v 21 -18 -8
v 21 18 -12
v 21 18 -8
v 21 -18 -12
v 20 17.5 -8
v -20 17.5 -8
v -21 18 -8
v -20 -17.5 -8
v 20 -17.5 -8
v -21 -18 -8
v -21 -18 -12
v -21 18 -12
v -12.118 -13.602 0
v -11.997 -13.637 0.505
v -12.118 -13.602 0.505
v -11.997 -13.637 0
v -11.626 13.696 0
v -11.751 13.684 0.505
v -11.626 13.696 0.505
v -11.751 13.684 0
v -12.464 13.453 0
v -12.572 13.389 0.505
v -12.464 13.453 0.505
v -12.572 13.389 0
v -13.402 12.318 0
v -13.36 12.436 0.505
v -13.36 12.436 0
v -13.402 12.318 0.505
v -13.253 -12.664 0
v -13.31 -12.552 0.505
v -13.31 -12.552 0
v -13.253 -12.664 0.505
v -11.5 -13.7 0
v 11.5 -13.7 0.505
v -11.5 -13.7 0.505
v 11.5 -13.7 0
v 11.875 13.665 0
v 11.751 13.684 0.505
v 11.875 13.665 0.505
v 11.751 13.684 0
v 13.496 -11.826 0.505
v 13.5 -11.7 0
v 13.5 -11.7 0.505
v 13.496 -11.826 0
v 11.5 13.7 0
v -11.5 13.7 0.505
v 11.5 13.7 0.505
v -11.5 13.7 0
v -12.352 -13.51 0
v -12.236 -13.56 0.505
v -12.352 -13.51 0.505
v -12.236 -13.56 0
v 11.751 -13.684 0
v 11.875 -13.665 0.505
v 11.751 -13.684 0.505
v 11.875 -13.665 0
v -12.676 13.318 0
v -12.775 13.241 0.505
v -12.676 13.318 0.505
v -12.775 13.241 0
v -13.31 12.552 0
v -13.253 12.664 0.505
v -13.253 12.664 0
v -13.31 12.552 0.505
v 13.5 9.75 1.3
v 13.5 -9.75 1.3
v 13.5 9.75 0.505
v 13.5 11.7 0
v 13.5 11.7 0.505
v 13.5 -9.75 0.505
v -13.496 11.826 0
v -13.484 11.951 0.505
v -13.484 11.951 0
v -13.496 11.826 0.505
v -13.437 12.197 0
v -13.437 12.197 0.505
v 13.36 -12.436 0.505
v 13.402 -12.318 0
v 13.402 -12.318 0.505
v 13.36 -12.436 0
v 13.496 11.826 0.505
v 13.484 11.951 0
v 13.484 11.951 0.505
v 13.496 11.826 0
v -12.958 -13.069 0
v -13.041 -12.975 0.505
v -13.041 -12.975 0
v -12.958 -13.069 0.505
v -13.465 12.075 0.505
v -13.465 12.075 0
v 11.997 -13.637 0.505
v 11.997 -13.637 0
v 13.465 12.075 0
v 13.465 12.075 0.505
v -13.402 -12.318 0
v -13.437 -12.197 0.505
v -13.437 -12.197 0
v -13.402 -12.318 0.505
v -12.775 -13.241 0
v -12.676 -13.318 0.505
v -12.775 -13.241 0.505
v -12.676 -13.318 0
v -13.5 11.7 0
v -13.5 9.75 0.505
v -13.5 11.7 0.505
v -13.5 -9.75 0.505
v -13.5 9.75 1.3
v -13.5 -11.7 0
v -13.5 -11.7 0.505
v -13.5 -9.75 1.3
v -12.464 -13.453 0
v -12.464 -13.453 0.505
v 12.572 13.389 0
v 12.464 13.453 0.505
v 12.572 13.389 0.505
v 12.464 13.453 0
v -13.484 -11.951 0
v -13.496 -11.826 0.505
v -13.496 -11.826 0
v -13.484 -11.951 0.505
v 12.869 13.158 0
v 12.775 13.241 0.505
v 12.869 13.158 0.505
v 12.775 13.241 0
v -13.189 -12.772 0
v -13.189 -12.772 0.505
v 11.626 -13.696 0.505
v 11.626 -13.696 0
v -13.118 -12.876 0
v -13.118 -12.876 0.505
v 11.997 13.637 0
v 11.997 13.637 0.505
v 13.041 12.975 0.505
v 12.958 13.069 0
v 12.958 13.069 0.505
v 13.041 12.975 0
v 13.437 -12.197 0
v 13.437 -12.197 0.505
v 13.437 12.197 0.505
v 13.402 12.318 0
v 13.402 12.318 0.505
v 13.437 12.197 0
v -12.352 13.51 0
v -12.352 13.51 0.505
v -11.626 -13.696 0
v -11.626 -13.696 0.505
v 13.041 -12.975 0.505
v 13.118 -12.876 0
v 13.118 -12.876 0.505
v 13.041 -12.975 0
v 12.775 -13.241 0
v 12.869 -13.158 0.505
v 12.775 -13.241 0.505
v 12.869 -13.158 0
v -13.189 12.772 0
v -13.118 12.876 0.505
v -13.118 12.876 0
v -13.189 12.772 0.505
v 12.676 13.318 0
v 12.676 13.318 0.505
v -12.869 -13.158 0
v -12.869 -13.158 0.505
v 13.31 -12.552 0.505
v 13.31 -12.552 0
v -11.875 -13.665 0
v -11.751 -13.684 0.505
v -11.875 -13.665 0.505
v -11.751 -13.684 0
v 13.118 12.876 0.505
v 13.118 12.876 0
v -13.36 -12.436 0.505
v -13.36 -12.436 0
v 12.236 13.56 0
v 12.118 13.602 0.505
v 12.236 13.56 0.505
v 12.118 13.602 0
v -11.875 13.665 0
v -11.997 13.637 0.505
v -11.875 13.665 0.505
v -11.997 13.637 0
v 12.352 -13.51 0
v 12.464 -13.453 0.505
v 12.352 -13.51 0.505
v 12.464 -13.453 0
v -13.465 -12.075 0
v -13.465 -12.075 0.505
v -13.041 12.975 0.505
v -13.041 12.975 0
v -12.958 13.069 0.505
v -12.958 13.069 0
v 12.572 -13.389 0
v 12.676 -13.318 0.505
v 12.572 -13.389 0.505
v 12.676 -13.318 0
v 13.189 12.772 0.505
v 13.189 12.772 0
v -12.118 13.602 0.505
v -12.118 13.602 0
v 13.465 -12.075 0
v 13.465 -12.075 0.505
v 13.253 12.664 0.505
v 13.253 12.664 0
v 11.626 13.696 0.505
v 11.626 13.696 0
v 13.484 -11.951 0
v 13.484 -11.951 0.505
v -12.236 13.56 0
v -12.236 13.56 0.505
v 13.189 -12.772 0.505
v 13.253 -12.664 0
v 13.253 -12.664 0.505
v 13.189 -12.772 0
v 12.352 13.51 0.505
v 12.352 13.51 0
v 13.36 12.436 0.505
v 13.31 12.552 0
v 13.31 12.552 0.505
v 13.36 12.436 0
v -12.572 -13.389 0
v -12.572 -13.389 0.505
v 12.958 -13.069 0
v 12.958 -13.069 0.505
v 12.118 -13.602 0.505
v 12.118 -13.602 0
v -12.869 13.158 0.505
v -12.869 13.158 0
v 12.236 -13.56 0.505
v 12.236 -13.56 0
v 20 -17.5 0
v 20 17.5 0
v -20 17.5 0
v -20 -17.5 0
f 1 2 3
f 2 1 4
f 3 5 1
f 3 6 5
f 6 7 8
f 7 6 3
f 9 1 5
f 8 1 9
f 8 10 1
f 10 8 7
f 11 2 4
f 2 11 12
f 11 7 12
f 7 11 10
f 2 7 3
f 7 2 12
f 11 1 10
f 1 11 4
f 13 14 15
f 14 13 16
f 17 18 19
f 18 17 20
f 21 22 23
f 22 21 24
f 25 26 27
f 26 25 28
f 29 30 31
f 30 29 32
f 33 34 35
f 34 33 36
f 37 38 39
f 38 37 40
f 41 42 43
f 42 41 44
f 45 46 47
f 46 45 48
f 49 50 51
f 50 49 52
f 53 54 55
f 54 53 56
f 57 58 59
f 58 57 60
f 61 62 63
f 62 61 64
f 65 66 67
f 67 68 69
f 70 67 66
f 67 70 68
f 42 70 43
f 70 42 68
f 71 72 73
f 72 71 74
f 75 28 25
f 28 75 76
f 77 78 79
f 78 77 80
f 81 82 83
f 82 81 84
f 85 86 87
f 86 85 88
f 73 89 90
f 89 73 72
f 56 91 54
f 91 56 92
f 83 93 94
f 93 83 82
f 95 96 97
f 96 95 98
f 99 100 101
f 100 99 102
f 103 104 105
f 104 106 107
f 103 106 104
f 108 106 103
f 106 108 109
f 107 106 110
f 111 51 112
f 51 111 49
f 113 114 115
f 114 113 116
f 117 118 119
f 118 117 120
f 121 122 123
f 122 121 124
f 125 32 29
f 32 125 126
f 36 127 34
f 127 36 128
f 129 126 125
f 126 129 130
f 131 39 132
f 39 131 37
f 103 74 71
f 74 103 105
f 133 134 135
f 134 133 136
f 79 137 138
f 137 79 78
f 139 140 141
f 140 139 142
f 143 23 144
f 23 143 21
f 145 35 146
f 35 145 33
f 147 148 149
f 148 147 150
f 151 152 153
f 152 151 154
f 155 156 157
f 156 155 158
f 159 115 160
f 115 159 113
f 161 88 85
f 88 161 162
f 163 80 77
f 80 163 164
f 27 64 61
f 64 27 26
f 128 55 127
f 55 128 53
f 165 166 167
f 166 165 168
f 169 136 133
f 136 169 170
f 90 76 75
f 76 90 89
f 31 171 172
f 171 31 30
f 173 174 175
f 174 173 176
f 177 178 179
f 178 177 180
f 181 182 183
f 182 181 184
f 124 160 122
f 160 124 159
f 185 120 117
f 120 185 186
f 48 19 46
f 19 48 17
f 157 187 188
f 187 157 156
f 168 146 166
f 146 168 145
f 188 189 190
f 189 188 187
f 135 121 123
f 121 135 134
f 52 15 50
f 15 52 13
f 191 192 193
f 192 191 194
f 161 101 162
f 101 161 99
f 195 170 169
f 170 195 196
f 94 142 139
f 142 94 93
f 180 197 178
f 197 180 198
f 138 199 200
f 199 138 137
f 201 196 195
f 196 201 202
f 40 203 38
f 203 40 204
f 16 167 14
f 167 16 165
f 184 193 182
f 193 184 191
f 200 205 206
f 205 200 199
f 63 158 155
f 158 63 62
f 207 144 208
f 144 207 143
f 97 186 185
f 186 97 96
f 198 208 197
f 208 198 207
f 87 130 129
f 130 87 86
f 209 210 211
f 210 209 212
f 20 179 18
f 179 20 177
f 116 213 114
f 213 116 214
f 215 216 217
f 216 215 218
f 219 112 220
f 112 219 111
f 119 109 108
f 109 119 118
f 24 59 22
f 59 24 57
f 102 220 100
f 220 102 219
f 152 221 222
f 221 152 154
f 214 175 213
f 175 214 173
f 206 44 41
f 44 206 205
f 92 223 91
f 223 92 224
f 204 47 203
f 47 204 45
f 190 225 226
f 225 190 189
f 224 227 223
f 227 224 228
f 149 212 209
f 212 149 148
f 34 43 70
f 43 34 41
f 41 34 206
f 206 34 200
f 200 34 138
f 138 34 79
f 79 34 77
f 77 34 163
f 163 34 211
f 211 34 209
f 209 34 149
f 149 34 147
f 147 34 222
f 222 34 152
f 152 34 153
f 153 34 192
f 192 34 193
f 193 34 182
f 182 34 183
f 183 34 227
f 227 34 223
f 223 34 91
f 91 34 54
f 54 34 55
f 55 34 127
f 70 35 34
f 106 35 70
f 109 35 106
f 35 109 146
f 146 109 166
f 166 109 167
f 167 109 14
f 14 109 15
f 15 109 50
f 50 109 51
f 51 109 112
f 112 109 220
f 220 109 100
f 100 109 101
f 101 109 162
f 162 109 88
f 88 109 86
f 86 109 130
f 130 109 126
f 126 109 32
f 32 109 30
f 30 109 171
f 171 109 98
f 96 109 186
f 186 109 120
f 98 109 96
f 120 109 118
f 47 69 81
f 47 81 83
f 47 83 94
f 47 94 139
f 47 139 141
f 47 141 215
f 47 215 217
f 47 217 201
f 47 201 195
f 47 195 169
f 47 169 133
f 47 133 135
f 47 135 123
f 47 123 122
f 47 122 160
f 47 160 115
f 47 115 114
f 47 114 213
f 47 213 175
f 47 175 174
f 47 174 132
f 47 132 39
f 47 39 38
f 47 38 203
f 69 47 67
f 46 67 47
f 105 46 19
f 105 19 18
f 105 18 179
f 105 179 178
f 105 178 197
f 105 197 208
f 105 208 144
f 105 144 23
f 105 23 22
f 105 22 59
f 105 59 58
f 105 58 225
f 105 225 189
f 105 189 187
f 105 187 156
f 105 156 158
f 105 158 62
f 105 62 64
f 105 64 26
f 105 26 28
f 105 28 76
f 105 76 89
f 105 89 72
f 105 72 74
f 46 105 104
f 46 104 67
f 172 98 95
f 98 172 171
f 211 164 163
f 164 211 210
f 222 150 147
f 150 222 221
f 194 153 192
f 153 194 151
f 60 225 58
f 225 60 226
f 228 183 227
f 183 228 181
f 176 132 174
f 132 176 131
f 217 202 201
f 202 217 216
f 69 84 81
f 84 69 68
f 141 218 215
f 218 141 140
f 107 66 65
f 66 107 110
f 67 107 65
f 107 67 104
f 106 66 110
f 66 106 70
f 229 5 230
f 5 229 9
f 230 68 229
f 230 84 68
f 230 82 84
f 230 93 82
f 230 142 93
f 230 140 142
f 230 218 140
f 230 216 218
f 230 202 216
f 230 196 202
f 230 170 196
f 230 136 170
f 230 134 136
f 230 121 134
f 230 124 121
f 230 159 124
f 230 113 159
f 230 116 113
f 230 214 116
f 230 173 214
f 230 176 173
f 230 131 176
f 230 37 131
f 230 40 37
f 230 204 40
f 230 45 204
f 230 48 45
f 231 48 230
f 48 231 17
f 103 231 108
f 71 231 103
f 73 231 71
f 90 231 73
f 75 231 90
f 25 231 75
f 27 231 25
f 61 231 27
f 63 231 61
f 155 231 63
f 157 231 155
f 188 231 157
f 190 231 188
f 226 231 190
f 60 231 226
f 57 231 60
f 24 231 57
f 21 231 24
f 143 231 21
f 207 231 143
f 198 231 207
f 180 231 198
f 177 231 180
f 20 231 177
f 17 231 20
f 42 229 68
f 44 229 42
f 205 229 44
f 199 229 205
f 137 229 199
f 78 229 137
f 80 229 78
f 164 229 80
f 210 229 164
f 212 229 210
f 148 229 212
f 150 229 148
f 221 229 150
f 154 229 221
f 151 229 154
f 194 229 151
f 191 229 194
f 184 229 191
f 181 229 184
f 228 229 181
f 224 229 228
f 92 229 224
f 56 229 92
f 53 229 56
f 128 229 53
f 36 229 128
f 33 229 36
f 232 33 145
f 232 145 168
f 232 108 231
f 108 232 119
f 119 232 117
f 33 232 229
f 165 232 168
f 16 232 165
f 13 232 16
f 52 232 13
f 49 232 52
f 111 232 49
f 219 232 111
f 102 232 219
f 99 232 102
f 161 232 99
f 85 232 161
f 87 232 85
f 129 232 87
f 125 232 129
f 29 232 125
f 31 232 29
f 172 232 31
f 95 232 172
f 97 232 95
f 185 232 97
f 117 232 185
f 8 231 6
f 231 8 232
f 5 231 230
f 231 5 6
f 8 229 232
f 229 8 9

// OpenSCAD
translate([0,0,-10])
color("blue")cube([42,36,4], true);
//Akku

$fn=100;

minkowski() {
    color("Blue", 1) cube([23,23.4,1], center=true);
    cylinder(r=2,h=0.01, center=true);
}
color("Grey", 1) translate([0,0,0.9]) cube([27,19.5,0.8], center=true);
//Bildschirm
translate([0,0,-5]) color("red")
cube([40,35,10], true)

translate([10,10,10])rotate([0,180,0])difference() {
    cube([10,10,2.5], center=true);
    translate([0,0,0.1]) 
    cube([7,8,2.5], center=true);
}//Taster
